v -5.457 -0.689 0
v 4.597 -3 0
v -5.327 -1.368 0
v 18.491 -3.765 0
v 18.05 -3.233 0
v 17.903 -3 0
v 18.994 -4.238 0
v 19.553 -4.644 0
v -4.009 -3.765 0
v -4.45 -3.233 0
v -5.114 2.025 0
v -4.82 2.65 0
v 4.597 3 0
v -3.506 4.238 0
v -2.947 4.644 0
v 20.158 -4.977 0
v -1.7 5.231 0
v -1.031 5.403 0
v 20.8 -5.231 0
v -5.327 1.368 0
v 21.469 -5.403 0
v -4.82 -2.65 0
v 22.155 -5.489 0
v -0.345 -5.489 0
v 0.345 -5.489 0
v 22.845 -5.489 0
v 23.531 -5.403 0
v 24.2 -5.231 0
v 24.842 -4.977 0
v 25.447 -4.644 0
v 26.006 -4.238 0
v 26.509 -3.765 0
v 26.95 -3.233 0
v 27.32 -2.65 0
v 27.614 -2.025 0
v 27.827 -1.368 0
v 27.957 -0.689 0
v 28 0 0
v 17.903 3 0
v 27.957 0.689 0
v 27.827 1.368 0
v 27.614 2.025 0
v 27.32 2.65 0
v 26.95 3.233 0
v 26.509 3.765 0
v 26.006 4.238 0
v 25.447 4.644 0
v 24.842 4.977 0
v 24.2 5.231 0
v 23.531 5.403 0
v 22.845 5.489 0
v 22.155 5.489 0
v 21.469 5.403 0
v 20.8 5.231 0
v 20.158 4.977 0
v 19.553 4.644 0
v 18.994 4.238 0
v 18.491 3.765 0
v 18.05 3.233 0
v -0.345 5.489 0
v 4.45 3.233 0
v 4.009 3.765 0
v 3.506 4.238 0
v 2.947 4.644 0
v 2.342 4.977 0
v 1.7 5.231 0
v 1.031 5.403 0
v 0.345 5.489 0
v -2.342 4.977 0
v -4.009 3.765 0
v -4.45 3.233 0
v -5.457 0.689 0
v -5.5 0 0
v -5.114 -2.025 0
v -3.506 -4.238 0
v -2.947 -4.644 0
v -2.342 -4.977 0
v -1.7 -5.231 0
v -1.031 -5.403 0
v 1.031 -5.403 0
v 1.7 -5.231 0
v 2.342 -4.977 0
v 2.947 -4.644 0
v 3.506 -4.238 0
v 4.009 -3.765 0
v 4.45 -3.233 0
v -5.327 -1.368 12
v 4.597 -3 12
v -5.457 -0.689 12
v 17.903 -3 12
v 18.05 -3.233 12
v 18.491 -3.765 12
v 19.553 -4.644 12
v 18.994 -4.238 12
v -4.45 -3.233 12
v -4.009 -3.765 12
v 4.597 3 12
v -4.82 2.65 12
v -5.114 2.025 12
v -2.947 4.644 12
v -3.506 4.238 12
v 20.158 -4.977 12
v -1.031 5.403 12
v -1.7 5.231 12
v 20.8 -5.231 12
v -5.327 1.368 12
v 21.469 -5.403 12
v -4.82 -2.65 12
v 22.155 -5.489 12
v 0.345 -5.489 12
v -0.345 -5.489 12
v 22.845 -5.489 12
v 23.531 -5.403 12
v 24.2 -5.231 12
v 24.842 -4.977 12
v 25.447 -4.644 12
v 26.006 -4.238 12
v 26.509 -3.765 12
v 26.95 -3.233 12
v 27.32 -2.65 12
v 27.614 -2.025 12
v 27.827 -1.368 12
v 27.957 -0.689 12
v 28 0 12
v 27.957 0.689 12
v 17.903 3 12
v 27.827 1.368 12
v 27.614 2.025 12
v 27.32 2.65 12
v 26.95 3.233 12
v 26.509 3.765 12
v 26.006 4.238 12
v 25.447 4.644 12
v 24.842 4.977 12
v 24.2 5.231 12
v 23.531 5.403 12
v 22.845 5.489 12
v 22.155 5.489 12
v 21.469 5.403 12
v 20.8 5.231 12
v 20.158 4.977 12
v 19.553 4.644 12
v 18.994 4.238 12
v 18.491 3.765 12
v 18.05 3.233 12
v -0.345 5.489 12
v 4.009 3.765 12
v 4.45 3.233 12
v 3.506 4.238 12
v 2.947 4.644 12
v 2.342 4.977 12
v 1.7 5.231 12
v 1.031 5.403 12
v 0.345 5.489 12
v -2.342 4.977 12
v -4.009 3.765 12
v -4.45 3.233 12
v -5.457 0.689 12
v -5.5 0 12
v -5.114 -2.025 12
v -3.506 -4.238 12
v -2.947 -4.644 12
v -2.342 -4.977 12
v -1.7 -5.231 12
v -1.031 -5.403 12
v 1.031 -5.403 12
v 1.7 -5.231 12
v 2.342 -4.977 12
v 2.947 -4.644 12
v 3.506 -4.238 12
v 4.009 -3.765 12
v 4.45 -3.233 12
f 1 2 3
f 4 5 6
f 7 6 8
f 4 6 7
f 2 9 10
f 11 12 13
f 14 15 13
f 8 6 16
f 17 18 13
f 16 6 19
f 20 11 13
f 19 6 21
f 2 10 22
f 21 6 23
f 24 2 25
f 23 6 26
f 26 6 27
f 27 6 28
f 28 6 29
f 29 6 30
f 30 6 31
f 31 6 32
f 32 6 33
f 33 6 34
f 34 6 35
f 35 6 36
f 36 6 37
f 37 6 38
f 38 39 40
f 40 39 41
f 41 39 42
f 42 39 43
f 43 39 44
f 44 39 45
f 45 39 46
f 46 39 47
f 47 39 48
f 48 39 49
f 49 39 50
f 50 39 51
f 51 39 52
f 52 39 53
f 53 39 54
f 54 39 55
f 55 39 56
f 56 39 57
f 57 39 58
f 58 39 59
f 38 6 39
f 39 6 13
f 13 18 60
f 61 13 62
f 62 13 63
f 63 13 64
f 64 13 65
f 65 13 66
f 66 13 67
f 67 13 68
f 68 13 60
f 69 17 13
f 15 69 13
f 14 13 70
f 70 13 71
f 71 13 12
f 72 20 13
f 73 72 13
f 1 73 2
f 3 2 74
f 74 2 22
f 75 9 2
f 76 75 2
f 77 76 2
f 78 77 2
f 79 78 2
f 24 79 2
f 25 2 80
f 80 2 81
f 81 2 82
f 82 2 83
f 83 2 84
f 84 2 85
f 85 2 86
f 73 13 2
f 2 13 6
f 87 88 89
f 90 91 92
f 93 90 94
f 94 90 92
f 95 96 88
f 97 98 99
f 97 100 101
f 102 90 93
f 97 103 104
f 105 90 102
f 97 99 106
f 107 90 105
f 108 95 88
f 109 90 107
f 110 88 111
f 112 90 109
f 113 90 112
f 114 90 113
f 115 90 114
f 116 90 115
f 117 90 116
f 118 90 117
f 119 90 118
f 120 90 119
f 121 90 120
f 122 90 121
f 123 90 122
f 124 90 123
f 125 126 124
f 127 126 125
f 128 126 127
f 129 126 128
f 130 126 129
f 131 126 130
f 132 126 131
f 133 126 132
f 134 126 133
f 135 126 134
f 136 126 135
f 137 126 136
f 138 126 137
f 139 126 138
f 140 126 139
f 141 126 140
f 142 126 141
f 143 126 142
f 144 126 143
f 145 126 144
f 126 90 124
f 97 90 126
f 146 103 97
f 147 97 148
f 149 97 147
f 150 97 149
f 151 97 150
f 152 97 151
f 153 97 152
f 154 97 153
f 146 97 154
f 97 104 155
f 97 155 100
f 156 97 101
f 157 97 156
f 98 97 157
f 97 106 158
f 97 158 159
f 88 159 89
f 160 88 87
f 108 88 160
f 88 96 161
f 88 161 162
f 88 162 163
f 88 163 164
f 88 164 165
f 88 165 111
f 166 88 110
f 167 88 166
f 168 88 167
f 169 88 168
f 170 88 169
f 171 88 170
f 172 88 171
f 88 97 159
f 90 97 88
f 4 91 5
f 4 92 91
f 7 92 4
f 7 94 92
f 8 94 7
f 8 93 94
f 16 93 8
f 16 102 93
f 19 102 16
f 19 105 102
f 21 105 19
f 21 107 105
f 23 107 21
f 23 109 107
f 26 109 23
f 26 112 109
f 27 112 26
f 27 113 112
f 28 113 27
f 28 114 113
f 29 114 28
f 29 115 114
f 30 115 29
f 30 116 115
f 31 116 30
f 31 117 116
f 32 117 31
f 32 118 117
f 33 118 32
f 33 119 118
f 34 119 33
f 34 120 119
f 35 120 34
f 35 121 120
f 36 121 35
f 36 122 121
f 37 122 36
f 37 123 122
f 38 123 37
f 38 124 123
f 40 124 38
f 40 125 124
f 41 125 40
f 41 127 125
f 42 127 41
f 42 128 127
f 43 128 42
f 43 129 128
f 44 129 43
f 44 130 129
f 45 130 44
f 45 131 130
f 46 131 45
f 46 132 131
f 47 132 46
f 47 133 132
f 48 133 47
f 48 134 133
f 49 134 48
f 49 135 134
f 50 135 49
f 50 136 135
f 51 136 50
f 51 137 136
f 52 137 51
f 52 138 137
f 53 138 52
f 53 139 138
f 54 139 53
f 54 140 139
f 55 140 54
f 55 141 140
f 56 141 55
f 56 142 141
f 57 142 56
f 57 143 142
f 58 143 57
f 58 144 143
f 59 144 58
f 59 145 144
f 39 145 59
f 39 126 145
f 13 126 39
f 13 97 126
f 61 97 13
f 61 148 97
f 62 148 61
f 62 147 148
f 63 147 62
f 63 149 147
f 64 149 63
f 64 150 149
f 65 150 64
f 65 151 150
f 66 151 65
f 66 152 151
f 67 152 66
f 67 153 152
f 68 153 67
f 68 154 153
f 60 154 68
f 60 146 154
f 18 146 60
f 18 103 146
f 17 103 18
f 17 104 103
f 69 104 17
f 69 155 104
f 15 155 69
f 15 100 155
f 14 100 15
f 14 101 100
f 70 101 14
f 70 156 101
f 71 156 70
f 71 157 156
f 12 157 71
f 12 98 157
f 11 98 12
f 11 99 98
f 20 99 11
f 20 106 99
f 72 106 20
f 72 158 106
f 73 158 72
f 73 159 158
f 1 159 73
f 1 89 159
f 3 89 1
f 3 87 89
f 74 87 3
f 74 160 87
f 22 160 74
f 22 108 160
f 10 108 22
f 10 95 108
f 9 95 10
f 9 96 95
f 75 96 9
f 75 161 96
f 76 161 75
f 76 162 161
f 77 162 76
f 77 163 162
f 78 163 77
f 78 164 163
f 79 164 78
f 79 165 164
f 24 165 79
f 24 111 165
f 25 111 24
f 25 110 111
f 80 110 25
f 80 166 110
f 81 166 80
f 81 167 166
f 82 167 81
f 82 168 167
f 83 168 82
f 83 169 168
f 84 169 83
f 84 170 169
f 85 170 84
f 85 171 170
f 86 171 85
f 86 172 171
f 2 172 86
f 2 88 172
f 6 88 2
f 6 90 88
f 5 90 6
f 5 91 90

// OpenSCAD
// diameter
D = 11;
// full connection length
L = 17;
// connection width
W = 6;
// thickness
T = 12;

module conn() {
    union() {
        circle(d=D, $fn=50);
        translate([6.5,0,0])
            square([L-7, W], center=true);
    }
}

linear_extrude(T) {
    conn();
    translate([22.5,0,0]) rotate(180) conn();
}
    
